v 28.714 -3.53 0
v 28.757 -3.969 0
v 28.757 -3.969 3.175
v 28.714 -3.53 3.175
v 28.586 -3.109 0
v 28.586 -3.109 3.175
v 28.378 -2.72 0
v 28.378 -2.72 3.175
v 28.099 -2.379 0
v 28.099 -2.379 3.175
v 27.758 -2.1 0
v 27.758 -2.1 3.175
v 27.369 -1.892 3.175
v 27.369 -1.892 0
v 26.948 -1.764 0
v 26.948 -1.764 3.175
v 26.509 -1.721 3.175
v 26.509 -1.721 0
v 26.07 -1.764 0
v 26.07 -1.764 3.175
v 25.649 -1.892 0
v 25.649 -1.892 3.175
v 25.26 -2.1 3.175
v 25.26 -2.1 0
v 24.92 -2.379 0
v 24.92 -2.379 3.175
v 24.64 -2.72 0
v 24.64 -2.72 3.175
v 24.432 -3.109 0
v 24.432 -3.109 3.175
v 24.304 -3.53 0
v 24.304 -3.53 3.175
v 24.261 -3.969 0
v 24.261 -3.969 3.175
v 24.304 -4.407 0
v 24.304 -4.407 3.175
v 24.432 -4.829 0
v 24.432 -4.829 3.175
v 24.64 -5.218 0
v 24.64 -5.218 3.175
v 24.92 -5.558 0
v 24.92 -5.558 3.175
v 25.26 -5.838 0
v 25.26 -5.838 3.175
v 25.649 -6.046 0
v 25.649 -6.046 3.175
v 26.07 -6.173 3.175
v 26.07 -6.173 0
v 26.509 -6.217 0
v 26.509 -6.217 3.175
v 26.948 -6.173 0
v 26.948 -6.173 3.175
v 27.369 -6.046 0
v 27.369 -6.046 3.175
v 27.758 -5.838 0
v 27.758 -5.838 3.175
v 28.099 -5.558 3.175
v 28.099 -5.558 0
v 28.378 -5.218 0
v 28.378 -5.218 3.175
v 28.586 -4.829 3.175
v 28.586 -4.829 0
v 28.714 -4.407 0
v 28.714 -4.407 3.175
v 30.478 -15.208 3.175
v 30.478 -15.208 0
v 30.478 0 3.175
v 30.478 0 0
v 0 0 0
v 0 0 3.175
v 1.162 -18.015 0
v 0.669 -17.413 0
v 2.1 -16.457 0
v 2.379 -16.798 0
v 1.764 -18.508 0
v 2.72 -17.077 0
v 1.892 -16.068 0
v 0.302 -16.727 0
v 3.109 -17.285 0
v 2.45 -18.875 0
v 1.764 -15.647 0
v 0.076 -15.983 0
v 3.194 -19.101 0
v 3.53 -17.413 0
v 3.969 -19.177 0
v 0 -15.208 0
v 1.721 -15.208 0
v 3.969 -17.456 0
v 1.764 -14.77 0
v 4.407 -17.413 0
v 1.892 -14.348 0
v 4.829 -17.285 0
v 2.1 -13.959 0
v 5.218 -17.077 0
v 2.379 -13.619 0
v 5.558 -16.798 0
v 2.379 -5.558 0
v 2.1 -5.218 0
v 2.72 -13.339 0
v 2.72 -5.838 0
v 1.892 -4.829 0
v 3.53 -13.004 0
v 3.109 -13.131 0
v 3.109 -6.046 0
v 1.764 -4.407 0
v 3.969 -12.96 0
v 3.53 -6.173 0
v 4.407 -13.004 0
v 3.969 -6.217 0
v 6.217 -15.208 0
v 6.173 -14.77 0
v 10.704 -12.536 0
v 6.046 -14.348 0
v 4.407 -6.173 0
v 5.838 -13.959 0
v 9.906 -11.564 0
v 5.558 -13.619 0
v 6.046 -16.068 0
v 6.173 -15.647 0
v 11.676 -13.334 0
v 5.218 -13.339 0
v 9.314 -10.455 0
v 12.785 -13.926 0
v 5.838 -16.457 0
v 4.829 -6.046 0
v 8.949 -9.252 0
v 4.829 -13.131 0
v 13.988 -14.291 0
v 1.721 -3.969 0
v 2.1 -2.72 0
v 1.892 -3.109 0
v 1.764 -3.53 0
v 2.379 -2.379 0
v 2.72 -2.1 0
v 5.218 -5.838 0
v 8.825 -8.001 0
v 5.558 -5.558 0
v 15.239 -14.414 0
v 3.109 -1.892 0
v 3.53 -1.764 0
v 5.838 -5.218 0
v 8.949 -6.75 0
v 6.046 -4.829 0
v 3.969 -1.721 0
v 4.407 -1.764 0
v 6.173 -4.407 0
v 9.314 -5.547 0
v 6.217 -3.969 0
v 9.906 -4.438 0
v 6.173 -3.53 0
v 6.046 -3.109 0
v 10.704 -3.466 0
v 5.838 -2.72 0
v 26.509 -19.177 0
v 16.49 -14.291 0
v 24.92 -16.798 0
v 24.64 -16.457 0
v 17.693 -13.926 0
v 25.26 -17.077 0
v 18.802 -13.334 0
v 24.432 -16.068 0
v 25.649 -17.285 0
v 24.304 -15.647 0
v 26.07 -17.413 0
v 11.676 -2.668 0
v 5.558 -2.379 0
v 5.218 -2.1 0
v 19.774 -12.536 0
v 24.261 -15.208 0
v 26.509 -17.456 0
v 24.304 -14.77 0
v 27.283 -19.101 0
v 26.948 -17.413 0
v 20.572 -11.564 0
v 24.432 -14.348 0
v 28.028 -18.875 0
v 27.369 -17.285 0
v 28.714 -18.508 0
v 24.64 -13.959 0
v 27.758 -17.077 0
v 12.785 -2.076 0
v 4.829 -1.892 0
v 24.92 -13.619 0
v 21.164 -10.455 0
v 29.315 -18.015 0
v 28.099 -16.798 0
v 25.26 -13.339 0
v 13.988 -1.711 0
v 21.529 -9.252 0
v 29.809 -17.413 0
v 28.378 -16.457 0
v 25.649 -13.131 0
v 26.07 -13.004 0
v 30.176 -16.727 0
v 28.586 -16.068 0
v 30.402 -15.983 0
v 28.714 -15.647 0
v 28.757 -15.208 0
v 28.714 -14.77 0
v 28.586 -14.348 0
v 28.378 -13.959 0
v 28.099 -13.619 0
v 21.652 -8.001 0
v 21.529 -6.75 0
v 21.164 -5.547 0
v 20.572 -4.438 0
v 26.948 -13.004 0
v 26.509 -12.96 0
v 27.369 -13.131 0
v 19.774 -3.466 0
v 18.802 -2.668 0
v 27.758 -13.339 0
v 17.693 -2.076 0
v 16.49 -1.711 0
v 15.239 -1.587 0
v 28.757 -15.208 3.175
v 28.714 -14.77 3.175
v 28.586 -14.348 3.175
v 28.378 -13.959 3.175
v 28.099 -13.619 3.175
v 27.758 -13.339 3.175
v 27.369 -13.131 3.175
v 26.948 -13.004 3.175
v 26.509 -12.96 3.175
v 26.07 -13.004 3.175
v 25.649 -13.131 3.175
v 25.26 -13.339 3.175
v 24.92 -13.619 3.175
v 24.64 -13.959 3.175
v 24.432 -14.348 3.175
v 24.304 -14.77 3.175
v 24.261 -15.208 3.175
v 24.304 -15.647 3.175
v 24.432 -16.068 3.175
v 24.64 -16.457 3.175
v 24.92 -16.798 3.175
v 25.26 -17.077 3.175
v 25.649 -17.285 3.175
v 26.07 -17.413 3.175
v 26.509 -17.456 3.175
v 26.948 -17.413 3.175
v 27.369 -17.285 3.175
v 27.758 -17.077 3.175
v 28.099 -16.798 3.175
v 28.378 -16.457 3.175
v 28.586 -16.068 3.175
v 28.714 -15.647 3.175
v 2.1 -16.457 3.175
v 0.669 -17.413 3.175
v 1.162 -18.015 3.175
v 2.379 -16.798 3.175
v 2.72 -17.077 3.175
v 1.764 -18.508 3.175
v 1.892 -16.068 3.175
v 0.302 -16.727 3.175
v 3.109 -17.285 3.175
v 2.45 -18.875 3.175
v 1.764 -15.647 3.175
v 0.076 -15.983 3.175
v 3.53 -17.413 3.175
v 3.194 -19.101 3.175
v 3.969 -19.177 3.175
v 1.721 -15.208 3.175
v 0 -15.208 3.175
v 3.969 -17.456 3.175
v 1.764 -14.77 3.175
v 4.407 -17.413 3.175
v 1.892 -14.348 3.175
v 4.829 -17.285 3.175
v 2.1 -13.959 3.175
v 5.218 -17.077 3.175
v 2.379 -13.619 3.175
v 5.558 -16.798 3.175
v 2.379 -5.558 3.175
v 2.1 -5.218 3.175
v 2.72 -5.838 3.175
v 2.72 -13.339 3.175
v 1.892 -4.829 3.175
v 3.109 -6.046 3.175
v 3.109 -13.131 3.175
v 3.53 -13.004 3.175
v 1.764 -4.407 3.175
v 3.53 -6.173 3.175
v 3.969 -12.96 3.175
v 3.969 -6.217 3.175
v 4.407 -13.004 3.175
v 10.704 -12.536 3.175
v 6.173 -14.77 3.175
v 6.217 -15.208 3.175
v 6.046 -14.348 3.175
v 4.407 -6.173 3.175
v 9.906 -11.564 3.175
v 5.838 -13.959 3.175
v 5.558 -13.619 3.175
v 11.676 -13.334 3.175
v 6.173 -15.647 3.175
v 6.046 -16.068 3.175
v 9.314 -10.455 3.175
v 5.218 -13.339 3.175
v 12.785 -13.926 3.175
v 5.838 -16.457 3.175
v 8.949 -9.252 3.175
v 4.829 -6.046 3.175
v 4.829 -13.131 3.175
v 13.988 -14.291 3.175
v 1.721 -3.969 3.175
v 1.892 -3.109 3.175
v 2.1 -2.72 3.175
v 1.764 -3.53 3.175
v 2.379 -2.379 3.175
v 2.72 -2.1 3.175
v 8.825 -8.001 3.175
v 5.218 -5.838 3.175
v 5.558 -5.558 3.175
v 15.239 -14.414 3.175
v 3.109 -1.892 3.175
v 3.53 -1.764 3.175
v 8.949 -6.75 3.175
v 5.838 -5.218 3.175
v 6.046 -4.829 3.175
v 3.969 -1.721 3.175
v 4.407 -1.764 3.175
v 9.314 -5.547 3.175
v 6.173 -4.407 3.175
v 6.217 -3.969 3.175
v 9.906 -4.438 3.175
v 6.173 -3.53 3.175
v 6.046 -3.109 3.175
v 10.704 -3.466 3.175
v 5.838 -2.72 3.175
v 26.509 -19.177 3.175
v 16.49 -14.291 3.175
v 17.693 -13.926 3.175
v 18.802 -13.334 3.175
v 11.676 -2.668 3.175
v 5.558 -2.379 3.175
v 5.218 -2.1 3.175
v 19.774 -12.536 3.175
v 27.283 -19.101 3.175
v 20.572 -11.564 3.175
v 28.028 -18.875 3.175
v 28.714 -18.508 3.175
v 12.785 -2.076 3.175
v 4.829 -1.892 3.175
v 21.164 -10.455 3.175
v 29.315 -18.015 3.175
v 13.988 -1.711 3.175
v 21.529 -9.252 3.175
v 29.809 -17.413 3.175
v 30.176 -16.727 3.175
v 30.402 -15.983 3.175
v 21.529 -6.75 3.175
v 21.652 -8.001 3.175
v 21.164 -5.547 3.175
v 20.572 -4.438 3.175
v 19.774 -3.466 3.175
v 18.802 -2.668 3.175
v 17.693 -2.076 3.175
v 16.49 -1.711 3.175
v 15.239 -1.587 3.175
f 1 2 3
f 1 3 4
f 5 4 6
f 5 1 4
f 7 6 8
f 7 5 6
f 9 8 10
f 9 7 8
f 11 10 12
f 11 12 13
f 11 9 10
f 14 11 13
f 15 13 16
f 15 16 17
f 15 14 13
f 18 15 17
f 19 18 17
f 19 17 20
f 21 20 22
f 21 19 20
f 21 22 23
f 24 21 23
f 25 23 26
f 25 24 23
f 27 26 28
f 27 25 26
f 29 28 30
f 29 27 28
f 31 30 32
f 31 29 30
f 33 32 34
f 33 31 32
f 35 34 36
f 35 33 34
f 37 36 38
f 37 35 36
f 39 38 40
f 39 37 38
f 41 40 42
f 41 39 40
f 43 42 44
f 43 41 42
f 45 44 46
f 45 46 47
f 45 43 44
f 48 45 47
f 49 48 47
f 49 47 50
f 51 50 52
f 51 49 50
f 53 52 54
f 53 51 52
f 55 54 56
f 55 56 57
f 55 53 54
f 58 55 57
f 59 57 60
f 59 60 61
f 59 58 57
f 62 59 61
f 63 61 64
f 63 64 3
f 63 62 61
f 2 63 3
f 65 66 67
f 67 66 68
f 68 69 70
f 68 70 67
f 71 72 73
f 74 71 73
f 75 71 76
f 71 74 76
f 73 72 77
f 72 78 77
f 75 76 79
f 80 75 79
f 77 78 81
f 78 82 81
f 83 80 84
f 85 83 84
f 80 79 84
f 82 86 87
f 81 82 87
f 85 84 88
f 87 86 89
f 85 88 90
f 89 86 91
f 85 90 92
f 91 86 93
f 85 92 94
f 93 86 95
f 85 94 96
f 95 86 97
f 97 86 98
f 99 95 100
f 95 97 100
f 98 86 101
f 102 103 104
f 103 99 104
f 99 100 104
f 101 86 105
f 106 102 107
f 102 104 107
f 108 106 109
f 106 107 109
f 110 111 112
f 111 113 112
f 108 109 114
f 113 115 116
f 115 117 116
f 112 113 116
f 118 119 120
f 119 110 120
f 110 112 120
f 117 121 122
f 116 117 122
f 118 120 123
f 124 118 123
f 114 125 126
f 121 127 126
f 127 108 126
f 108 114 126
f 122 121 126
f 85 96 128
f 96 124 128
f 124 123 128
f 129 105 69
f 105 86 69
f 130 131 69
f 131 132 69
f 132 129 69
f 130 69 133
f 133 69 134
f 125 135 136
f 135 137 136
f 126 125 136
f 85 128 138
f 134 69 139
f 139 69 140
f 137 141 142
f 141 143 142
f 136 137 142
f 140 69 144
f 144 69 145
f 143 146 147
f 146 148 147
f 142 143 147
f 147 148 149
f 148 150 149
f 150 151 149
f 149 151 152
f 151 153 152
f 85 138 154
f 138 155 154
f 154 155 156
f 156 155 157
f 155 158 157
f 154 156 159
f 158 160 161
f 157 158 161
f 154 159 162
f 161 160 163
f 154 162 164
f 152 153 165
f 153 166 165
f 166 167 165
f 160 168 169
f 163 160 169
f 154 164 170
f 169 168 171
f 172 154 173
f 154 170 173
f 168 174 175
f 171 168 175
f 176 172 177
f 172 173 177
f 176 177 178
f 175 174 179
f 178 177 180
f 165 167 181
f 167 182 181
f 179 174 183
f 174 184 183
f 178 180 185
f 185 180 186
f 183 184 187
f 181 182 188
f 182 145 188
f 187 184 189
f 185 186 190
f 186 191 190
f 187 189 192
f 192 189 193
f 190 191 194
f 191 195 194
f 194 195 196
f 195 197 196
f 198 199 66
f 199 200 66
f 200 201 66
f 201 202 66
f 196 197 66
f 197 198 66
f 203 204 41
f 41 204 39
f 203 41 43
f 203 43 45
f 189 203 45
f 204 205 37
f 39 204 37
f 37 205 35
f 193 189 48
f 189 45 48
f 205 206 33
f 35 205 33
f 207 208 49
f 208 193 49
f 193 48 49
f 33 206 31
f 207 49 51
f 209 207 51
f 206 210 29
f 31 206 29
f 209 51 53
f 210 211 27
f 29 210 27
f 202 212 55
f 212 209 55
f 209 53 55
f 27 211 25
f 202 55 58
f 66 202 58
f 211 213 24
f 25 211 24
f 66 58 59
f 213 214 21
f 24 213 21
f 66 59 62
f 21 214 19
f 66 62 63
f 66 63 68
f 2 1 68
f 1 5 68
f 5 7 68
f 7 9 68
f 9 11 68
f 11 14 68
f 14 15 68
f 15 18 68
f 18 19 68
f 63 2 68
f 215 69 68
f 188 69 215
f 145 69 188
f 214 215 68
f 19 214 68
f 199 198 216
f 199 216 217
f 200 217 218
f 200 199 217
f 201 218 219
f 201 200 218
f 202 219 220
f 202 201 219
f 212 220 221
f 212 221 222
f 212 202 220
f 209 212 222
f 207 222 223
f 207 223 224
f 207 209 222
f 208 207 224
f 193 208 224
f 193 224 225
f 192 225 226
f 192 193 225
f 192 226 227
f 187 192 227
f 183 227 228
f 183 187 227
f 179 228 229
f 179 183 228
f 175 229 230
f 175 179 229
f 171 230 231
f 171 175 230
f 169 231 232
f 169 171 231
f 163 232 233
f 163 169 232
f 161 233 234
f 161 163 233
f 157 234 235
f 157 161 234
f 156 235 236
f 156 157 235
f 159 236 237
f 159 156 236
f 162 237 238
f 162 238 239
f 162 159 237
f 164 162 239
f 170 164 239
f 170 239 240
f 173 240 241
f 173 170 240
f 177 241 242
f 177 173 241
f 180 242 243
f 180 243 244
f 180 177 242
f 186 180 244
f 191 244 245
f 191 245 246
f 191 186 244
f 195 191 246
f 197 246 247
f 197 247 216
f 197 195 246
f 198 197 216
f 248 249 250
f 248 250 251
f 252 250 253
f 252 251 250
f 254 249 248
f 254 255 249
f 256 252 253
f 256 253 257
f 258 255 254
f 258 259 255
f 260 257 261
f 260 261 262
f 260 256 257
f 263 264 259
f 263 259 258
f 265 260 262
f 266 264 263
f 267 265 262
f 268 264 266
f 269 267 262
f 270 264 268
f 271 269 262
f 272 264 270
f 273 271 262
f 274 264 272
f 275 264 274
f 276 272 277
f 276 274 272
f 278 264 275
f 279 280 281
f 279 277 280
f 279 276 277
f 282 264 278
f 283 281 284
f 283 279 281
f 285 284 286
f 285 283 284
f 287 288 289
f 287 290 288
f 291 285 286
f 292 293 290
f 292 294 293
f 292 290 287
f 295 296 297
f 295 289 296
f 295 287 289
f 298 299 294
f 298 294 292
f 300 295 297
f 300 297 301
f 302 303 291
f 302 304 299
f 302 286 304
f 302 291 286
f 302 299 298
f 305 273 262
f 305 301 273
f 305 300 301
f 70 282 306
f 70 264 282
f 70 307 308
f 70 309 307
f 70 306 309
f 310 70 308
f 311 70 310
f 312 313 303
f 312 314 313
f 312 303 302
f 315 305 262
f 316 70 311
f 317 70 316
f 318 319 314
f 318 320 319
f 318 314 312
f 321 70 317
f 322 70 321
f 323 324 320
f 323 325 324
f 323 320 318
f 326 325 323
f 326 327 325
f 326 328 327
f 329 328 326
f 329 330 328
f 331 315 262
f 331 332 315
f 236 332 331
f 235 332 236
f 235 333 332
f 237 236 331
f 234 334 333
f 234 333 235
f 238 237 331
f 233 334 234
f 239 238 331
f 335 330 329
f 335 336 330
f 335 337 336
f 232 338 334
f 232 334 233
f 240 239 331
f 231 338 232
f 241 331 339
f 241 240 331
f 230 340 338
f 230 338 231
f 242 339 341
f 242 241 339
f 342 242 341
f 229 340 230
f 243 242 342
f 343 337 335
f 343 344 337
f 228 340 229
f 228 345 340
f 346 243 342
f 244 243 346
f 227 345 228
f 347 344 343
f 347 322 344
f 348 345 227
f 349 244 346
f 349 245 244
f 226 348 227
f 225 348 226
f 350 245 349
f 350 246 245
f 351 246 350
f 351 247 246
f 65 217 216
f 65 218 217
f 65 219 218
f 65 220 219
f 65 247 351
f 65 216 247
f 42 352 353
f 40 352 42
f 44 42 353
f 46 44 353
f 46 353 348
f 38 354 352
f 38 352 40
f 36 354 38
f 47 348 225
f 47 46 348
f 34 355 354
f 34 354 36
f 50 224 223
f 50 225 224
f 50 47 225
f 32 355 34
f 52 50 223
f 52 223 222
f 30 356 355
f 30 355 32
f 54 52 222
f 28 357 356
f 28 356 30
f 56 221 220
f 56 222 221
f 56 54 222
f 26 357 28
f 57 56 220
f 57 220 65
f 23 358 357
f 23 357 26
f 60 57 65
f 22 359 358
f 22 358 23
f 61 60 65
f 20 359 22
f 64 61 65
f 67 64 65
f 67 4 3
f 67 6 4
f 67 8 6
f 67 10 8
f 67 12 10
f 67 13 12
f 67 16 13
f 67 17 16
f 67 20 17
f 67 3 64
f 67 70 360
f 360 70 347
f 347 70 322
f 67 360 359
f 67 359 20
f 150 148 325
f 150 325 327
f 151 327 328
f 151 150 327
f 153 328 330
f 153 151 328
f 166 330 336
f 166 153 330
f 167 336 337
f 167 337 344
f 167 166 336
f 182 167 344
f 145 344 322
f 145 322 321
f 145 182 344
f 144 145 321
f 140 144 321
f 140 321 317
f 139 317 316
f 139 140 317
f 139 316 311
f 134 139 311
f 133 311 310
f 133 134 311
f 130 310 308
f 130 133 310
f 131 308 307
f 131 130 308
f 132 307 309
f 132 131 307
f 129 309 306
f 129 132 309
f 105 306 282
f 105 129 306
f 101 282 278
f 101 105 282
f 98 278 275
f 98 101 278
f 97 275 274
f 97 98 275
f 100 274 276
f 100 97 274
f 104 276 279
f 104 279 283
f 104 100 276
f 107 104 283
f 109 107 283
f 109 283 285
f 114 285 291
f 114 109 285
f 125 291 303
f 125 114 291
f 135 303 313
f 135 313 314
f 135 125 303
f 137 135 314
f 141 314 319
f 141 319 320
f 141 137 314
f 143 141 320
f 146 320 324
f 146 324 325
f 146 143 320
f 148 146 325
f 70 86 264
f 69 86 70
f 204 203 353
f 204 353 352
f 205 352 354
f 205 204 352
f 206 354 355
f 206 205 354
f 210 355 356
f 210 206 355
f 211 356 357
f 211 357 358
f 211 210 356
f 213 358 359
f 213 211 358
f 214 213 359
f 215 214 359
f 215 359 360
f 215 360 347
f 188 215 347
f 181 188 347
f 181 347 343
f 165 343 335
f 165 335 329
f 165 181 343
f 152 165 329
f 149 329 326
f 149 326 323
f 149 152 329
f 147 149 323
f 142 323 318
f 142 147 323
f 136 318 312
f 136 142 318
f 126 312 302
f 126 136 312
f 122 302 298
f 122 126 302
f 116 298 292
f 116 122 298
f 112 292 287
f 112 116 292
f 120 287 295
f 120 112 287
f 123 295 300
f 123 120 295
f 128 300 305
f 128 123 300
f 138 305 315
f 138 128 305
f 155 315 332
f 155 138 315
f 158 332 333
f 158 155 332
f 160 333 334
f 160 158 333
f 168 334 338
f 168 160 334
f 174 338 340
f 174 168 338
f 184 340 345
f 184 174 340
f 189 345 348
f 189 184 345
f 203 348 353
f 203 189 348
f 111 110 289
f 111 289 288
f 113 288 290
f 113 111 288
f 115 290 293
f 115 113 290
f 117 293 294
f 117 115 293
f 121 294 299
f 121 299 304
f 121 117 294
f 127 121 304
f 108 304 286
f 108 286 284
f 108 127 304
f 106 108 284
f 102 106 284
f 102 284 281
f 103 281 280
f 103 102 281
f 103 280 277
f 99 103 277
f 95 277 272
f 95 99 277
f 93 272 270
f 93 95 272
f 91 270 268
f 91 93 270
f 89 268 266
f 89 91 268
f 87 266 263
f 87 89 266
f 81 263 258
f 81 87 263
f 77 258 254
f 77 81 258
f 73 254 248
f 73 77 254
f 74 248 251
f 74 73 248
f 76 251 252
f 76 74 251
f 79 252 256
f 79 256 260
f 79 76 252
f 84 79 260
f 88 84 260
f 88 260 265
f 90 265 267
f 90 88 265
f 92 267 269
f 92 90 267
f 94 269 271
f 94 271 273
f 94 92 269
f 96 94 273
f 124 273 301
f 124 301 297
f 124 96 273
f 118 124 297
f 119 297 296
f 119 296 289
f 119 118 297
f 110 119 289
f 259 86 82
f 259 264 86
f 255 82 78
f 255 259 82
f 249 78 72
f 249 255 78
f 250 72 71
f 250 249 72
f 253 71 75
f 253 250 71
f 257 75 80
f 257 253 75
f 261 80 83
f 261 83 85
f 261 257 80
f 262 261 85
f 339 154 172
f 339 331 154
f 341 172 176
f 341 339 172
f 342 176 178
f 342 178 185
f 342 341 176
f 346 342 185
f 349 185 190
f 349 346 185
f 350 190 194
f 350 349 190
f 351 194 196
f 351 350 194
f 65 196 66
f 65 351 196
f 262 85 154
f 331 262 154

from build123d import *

# Parameters (mm, degrees)
F0_W     = 30.477764
F0_H     = 19.177
F0_R     = 2.2479
F0_R_2   = 6.4135
F1_DEPTH = 3.175
F2_R     = 3.96875


with BuildPart() as f1:
    # F0 (on Top) → F1 (new body)
    with BuildSketch(Plane.XY):
        with Locations((15.238882, -9.5885)):
            Rectangle(F0_W, F0_H)
        with Locations((3.96875, -15.20825)):
            Circle(F0_R, mode=Mode.SUBTRACT)
        with Locations((26.509014, -15.20825)):
            Circle(F0_R, mode=Mode.SUBTRACT)
        with Locations((3.96875, -3.96875)):
            Circle(F0_R, mode=Mode.SUBTRACT)
        with Locations((15.238882, -8.001)):
            Circle(F0_R_2, mode=Mode.SUBTRACT)
        with Locations((26.509014, -3.96875)):
            Circle(F0_R, mode=Mode.SUBTRACT)
    extrude(amount=F1_DEPTH)

    # F2
    f2_edges = [f1.edges().sort_by_distance(p)[0] for p in [
        (0, -19.177, 1.5875),
        (30.477764, -19.177, 1.5875),
    ]]
    fillet(f2_edges, radius=F2_R)


solid = f1.part
